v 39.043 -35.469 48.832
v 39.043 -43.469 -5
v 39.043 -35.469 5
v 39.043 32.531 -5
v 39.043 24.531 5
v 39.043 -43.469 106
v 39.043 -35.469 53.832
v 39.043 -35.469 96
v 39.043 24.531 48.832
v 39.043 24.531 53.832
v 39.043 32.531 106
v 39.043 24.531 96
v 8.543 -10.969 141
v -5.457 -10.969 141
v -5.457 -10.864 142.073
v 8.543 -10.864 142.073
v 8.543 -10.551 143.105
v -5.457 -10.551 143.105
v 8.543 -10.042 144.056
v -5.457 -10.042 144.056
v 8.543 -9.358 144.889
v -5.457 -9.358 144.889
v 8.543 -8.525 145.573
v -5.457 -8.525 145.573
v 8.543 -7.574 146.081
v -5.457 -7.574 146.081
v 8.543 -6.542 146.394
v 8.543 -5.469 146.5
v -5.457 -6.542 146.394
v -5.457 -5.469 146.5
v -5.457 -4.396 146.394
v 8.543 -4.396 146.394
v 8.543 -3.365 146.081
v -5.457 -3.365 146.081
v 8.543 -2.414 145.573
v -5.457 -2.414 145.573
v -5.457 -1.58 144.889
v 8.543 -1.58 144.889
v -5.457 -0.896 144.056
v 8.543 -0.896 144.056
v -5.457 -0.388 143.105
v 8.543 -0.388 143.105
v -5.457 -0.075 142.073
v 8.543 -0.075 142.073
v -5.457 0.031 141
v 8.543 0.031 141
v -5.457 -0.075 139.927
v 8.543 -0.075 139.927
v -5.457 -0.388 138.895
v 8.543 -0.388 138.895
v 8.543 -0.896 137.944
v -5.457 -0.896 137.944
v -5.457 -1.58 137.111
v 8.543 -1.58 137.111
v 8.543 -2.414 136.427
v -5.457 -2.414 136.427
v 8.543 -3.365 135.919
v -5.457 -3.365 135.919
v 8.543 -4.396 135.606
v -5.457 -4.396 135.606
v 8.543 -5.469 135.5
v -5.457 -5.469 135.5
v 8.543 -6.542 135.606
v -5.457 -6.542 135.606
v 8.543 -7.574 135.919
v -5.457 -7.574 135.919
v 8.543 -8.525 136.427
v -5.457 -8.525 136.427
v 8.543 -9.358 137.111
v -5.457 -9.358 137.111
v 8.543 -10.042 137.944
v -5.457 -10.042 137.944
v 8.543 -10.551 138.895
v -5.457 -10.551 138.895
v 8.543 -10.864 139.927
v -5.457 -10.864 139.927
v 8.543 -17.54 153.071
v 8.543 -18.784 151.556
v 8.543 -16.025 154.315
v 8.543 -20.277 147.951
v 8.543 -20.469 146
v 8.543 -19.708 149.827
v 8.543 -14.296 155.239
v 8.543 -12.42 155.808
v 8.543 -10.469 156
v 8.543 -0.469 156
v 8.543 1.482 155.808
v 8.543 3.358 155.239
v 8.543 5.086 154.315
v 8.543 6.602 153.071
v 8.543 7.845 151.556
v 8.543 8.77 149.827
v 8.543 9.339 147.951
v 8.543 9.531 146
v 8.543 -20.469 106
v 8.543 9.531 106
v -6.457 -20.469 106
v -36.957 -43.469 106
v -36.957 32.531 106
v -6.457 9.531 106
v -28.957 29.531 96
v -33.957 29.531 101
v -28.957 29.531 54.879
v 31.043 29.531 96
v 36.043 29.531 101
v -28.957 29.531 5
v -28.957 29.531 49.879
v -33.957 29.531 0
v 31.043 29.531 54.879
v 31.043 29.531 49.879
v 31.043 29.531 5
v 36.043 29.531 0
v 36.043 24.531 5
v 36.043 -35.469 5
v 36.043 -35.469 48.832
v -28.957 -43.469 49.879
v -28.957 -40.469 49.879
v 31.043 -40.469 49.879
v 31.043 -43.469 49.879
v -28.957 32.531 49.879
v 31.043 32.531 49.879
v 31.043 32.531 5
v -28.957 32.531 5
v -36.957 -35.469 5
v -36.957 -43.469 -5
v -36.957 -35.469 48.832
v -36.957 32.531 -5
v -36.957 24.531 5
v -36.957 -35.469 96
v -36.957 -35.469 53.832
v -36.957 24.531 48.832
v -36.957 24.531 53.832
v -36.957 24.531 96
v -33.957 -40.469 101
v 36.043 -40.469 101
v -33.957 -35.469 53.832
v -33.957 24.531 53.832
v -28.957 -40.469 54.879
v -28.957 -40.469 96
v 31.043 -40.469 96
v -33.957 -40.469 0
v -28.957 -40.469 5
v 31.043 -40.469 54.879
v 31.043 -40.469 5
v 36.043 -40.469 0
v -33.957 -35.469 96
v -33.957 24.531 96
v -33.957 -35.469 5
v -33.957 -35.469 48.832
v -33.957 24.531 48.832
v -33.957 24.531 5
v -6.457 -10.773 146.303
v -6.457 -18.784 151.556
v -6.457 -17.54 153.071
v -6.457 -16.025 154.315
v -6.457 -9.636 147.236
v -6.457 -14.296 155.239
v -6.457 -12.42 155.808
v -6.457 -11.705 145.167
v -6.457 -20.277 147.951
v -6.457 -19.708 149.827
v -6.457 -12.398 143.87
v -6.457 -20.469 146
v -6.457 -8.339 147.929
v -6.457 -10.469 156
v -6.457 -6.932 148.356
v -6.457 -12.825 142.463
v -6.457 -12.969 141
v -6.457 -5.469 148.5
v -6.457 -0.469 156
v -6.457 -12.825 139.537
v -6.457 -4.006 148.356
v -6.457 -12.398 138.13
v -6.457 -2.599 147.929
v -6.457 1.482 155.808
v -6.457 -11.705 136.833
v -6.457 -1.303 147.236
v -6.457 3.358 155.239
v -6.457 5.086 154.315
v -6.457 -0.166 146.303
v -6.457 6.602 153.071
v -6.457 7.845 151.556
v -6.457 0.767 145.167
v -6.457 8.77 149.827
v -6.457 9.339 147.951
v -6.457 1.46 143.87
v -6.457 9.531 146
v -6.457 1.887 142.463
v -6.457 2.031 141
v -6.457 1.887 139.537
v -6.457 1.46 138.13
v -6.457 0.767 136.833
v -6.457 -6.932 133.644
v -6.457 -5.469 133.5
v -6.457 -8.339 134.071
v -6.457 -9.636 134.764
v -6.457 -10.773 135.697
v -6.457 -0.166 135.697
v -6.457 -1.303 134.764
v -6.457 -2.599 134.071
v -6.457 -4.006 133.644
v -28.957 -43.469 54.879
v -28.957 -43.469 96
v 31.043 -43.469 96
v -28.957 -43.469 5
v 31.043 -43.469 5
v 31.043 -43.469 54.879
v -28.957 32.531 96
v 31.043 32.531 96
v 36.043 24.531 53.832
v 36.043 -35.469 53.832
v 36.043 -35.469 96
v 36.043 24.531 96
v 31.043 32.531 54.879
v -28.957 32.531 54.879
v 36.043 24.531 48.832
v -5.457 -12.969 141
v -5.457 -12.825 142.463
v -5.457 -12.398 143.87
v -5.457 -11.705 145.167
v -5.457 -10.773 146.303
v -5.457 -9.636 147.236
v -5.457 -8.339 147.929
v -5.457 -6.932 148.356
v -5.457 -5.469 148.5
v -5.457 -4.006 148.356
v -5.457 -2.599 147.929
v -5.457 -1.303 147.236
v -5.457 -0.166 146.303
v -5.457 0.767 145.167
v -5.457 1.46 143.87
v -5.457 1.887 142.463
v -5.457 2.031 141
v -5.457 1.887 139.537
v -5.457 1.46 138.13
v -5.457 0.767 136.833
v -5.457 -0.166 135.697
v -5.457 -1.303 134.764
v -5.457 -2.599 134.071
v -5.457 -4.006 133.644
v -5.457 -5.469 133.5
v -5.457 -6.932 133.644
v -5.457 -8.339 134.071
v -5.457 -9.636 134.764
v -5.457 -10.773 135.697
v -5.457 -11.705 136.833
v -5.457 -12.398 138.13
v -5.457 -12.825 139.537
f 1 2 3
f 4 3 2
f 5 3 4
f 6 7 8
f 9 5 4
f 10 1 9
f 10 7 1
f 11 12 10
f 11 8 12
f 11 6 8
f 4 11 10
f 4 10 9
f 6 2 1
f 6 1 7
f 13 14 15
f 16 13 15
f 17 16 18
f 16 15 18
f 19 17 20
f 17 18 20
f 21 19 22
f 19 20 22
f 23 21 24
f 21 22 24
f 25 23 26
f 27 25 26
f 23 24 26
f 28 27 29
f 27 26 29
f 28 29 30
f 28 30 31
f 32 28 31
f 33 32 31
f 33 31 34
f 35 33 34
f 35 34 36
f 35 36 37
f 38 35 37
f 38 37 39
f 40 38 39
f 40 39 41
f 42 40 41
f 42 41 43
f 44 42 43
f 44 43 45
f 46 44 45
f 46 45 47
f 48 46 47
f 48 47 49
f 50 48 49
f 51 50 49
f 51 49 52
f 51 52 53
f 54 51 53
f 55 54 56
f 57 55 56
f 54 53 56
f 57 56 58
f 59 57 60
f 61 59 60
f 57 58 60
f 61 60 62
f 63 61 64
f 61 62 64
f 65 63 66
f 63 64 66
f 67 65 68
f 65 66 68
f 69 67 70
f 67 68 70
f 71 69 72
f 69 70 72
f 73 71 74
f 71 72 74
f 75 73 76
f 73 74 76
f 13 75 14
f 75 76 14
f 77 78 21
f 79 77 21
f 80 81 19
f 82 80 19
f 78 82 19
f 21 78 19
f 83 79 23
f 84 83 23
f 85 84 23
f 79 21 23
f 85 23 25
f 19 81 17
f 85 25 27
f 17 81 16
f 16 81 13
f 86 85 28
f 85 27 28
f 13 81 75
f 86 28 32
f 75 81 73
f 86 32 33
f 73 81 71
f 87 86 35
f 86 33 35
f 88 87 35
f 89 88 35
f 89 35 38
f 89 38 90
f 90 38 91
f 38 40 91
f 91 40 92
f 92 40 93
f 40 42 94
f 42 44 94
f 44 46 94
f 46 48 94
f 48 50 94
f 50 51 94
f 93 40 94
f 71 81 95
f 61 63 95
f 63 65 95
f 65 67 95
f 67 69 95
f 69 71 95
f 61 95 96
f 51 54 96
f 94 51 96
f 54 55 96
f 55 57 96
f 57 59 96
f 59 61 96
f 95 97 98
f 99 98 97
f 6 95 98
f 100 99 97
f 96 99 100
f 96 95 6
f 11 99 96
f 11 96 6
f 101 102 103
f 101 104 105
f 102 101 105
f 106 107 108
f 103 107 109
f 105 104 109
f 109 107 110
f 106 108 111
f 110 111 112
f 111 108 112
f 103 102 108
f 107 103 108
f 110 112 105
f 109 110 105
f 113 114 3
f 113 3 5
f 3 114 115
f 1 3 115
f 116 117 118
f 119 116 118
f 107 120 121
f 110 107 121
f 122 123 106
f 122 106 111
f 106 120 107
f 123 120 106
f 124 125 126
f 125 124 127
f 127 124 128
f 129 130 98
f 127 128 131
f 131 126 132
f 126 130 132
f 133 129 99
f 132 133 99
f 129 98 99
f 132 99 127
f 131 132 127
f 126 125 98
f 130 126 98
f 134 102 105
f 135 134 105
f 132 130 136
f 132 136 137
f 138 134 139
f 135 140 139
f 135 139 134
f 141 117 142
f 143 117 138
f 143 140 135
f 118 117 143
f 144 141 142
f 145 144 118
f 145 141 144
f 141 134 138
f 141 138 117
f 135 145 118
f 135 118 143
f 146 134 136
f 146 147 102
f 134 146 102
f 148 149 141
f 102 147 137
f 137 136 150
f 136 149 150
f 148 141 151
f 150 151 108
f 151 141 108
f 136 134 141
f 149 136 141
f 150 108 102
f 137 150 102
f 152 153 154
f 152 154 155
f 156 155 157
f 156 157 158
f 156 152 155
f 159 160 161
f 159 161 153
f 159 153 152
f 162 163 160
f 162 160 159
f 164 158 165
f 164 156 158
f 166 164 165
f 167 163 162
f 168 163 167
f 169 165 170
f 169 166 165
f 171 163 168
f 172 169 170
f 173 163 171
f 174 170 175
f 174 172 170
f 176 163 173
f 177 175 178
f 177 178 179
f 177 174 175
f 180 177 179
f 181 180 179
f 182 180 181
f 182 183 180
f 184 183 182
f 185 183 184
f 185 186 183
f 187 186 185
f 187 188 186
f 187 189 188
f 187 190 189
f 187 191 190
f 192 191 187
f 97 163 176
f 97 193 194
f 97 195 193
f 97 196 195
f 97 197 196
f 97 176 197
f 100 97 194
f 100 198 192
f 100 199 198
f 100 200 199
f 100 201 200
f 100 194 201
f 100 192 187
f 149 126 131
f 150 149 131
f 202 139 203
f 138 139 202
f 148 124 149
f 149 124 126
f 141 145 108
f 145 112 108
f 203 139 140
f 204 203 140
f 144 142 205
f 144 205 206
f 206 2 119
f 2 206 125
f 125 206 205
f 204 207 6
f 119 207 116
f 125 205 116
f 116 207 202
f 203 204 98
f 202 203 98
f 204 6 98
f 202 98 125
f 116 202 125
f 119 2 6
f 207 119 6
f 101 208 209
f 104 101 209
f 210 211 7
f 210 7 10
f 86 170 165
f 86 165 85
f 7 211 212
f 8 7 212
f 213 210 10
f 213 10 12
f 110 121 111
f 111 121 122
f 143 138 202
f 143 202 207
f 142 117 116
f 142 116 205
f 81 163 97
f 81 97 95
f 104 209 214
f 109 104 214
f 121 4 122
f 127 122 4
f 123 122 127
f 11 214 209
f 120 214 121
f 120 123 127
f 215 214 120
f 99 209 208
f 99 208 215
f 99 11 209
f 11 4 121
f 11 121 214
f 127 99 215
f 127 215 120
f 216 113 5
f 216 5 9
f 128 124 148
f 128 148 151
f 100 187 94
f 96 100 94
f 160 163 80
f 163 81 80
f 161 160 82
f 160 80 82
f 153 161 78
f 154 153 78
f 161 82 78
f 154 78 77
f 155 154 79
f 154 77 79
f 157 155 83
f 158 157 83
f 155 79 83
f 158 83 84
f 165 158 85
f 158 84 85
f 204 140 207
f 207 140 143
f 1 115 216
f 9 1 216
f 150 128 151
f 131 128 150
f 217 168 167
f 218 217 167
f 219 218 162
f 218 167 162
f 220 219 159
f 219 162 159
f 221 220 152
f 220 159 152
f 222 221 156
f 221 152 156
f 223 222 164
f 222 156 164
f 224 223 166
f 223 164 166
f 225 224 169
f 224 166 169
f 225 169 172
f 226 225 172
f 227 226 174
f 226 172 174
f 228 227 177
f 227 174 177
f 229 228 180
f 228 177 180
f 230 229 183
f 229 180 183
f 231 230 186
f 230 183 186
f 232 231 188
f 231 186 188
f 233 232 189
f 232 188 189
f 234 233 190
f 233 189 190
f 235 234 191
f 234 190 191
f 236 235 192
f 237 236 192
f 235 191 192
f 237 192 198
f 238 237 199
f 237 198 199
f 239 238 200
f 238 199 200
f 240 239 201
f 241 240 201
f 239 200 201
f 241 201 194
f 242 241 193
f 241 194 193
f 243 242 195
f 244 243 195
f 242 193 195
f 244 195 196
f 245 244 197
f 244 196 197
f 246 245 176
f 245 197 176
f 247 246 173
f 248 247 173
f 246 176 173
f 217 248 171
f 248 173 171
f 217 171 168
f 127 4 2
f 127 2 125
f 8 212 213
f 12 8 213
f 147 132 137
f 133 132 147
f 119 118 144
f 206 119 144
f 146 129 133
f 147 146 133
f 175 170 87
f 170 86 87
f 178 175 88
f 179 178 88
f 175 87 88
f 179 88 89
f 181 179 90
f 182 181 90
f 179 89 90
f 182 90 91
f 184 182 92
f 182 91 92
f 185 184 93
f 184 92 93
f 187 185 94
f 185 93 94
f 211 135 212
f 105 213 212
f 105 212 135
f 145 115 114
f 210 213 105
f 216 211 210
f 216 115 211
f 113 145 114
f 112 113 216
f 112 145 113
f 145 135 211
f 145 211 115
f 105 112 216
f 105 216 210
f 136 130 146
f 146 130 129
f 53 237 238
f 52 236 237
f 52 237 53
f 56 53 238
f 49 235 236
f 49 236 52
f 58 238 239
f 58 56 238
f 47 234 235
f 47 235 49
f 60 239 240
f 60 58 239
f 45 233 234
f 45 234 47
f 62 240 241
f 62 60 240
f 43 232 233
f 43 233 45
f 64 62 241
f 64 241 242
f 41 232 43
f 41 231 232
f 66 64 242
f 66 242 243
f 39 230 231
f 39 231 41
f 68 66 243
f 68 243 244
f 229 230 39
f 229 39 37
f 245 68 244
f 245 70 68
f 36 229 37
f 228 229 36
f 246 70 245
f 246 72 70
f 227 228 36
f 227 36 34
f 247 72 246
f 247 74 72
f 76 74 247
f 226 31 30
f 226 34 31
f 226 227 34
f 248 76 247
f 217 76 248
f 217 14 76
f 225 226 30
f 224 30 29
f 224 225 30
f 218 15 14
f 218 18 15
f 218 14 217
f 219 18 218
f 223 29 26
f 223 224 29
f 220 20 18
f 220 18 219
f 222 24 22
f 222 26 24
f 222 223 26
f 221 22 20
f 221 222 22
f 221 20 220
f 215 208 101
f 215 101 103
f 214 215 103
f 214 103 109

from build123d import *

# Parameters (mm, degrees)
ESQUISSE1_W             = 76
ESQUISSE1_H             = 76
ESQUISSE1_W_2           = 70
ESQUISSE1_H_2           = 70
BOSS_EXTRU_2_DEPTH      = 101
ESQUISSE2_W             = 76
ESQUISSE2_H             = 76
BOSS_EXTRU_3_DEPTH      = 5
ESQUISSE3_W             = 76
ESQUISSE3_H             = 76
BOSS_EXTRU_4_DEPTH      = 5
ESQUISSE4_W             = 60
ESQUISSE4_H             = 44.878799425
ESQUISSE4_H_2           = 41.121200575
ENL_V_MAT_EXTRU_1_DEPTH = 80
ESQUISSE5_W             = 43.832159463
ESQUISSE5_H             = 60
ESQUISSE5_W_2           = 42.167840537
ENL_V_MAT_EXTRU_2_DEPTH = 80
ESQUISSE8_W             = 15
ESQUISSE8_H             = 30
BOSS_EXTRU_6_DEPTH      = 50
CONG_6_R                = 10
CONG_7_R                = 10
ESQUISSE10_R            = 5.5
ENL_V_MAT_EXTRU_3_DEPTH = 25
ESQUISSE11_R            = 7.5
ENL_V_MAT_EXTRU_4_DEPTH = 1


with BuildPart() as part:
    # Esquisse1 → Boss.-Extru.2 (new body)
    with BuildSketch(Plane.XY):
        with Locations((1.043095631, -5.469290785)):
            Rectangle(ESQUISSE1_W, ESQUISSE1_H)
        with Locations((1.043095631, -5.469290785)):
            Rectangle(ESQUISSE1_W_2, ESQUISSE1_H_2, mode=Mode.SUBTRACT)
    extrude(amount=BOSS_EXTRU_2_DEPTH)

    # Esquisse2 → Boss.-Extru.3 (add)
    with BuildSketch(Plane.XY.offset(101)):
        with Locations((1.043095631, -5.469290785)):
            Rectangle(ESQUISSE2_W, ESQUISSE2_H)
    extrude(amount=BOSS_EXTRU_3_DEPTH)

    # Esquisse3 → Boss.-Extru.4 (add)
    with BuildSketch(Plane(origin=(0, 0, 0), x_dir=(-1, 0, 0), z_dir=(0, 0, -1))):
        with Locations((-1.043095631, -5.469290785)):
            Rectangle(ESQUISSE3_W, ESQUISSE3_H)
    extrude(amount=BOSS_EXTRU_4_DEPTH)

    # Esquisse4 → Enlèv. mat.-Extru.1 (cut)
    with BuildSketch(Plane(origin=(0, 32.530709215, 0), x_dir=(1, 0, 0), z_dir=(0, 1, 0))):
        with Locations((1.043095631, -27.439399713)):
            Rectangle(ESQUISSE4_W, ESQUISSE4_H)
        with Locations((1.043095631, -75.439399713)):
            Rectangle(ESQUISSE4_W, ESQUISSE4_H_2)
    extrude(amount=-ENL_V_MAT_EXTRU_1_DEPTH, mode=Mode.SUBTRACT)

    # Esquisse5 → Enlèv. mat.-Extru.2 (cut)
    with BuildSketch(Plane.ZY.offset(36.956904369)):
        with Locations((26.916079732, -5.469290785)):
            Rectangle(ESQUISSE5_W, ESQUISSE5_H)
        with Locations((74.916079732, -5.469290785)):
            Rectangle(ESQUISSE5_W_2, ESQUISSE5_H)
    extrude(amount=-ENL_V_MAT_EXTRU_2_DEPTH, mode=Mode.SUBTRACT)

    # Esquisse8 → Boss.-Extru.6 (add)
    with BuildSketch(Plane.XY.offset(106)):
        with Locations((1.043095631, -5.469290785)):
            Rectangle(ESQUISSE8_W, ESQUISSE8_H)
    extrude(amount=BOSS_EXTRU_6_DEPTH)

    # Congé6
    cong_6_edges = [part.edges().sort_by_distance(p)[0] for p in [
        (1.043095631, -20.469290785, 156),
    ]]
    fillet(cong_6_edges, radius=CONG_6_R)

    # Congé7
    cong_7_edges = [part.edges().sort_by_distance(p)[0] for p in [
        (1.043095631, 9.530709215, 156),
    ]]
    fillet(cong_7_edges, radius=CONG_7_R)

    # Esquisse10 → Enlèv. mat.-Extru.3 (cut)
    with BuildSketch(Plane.ZY.offset(6.456904369)):
        with Locations(Location((141, -5.469290785, 0), (0, 0, 270))):
            Circle(ESQUISSE10_R)
    extrude(amount=-ENL_V_MAT_EXTRU_3_DEPTH, mode=Mode.SUBTRACT)

    # Esquisse11 → Enlèv. mat.-Extru.4 (cut)
    with BuildSketch(Plane.ZY.offset(6.456904369)):
        with Locations(Location((141, -5.469290785, 0), (0, 0, 270))):
            Circle(ESQUISSE11_R)
    extrude(amount=-ENL_V_MAT_EXTRU_4_DEPTH, mode=Mode.SUBTRACT)


solid = part.part
